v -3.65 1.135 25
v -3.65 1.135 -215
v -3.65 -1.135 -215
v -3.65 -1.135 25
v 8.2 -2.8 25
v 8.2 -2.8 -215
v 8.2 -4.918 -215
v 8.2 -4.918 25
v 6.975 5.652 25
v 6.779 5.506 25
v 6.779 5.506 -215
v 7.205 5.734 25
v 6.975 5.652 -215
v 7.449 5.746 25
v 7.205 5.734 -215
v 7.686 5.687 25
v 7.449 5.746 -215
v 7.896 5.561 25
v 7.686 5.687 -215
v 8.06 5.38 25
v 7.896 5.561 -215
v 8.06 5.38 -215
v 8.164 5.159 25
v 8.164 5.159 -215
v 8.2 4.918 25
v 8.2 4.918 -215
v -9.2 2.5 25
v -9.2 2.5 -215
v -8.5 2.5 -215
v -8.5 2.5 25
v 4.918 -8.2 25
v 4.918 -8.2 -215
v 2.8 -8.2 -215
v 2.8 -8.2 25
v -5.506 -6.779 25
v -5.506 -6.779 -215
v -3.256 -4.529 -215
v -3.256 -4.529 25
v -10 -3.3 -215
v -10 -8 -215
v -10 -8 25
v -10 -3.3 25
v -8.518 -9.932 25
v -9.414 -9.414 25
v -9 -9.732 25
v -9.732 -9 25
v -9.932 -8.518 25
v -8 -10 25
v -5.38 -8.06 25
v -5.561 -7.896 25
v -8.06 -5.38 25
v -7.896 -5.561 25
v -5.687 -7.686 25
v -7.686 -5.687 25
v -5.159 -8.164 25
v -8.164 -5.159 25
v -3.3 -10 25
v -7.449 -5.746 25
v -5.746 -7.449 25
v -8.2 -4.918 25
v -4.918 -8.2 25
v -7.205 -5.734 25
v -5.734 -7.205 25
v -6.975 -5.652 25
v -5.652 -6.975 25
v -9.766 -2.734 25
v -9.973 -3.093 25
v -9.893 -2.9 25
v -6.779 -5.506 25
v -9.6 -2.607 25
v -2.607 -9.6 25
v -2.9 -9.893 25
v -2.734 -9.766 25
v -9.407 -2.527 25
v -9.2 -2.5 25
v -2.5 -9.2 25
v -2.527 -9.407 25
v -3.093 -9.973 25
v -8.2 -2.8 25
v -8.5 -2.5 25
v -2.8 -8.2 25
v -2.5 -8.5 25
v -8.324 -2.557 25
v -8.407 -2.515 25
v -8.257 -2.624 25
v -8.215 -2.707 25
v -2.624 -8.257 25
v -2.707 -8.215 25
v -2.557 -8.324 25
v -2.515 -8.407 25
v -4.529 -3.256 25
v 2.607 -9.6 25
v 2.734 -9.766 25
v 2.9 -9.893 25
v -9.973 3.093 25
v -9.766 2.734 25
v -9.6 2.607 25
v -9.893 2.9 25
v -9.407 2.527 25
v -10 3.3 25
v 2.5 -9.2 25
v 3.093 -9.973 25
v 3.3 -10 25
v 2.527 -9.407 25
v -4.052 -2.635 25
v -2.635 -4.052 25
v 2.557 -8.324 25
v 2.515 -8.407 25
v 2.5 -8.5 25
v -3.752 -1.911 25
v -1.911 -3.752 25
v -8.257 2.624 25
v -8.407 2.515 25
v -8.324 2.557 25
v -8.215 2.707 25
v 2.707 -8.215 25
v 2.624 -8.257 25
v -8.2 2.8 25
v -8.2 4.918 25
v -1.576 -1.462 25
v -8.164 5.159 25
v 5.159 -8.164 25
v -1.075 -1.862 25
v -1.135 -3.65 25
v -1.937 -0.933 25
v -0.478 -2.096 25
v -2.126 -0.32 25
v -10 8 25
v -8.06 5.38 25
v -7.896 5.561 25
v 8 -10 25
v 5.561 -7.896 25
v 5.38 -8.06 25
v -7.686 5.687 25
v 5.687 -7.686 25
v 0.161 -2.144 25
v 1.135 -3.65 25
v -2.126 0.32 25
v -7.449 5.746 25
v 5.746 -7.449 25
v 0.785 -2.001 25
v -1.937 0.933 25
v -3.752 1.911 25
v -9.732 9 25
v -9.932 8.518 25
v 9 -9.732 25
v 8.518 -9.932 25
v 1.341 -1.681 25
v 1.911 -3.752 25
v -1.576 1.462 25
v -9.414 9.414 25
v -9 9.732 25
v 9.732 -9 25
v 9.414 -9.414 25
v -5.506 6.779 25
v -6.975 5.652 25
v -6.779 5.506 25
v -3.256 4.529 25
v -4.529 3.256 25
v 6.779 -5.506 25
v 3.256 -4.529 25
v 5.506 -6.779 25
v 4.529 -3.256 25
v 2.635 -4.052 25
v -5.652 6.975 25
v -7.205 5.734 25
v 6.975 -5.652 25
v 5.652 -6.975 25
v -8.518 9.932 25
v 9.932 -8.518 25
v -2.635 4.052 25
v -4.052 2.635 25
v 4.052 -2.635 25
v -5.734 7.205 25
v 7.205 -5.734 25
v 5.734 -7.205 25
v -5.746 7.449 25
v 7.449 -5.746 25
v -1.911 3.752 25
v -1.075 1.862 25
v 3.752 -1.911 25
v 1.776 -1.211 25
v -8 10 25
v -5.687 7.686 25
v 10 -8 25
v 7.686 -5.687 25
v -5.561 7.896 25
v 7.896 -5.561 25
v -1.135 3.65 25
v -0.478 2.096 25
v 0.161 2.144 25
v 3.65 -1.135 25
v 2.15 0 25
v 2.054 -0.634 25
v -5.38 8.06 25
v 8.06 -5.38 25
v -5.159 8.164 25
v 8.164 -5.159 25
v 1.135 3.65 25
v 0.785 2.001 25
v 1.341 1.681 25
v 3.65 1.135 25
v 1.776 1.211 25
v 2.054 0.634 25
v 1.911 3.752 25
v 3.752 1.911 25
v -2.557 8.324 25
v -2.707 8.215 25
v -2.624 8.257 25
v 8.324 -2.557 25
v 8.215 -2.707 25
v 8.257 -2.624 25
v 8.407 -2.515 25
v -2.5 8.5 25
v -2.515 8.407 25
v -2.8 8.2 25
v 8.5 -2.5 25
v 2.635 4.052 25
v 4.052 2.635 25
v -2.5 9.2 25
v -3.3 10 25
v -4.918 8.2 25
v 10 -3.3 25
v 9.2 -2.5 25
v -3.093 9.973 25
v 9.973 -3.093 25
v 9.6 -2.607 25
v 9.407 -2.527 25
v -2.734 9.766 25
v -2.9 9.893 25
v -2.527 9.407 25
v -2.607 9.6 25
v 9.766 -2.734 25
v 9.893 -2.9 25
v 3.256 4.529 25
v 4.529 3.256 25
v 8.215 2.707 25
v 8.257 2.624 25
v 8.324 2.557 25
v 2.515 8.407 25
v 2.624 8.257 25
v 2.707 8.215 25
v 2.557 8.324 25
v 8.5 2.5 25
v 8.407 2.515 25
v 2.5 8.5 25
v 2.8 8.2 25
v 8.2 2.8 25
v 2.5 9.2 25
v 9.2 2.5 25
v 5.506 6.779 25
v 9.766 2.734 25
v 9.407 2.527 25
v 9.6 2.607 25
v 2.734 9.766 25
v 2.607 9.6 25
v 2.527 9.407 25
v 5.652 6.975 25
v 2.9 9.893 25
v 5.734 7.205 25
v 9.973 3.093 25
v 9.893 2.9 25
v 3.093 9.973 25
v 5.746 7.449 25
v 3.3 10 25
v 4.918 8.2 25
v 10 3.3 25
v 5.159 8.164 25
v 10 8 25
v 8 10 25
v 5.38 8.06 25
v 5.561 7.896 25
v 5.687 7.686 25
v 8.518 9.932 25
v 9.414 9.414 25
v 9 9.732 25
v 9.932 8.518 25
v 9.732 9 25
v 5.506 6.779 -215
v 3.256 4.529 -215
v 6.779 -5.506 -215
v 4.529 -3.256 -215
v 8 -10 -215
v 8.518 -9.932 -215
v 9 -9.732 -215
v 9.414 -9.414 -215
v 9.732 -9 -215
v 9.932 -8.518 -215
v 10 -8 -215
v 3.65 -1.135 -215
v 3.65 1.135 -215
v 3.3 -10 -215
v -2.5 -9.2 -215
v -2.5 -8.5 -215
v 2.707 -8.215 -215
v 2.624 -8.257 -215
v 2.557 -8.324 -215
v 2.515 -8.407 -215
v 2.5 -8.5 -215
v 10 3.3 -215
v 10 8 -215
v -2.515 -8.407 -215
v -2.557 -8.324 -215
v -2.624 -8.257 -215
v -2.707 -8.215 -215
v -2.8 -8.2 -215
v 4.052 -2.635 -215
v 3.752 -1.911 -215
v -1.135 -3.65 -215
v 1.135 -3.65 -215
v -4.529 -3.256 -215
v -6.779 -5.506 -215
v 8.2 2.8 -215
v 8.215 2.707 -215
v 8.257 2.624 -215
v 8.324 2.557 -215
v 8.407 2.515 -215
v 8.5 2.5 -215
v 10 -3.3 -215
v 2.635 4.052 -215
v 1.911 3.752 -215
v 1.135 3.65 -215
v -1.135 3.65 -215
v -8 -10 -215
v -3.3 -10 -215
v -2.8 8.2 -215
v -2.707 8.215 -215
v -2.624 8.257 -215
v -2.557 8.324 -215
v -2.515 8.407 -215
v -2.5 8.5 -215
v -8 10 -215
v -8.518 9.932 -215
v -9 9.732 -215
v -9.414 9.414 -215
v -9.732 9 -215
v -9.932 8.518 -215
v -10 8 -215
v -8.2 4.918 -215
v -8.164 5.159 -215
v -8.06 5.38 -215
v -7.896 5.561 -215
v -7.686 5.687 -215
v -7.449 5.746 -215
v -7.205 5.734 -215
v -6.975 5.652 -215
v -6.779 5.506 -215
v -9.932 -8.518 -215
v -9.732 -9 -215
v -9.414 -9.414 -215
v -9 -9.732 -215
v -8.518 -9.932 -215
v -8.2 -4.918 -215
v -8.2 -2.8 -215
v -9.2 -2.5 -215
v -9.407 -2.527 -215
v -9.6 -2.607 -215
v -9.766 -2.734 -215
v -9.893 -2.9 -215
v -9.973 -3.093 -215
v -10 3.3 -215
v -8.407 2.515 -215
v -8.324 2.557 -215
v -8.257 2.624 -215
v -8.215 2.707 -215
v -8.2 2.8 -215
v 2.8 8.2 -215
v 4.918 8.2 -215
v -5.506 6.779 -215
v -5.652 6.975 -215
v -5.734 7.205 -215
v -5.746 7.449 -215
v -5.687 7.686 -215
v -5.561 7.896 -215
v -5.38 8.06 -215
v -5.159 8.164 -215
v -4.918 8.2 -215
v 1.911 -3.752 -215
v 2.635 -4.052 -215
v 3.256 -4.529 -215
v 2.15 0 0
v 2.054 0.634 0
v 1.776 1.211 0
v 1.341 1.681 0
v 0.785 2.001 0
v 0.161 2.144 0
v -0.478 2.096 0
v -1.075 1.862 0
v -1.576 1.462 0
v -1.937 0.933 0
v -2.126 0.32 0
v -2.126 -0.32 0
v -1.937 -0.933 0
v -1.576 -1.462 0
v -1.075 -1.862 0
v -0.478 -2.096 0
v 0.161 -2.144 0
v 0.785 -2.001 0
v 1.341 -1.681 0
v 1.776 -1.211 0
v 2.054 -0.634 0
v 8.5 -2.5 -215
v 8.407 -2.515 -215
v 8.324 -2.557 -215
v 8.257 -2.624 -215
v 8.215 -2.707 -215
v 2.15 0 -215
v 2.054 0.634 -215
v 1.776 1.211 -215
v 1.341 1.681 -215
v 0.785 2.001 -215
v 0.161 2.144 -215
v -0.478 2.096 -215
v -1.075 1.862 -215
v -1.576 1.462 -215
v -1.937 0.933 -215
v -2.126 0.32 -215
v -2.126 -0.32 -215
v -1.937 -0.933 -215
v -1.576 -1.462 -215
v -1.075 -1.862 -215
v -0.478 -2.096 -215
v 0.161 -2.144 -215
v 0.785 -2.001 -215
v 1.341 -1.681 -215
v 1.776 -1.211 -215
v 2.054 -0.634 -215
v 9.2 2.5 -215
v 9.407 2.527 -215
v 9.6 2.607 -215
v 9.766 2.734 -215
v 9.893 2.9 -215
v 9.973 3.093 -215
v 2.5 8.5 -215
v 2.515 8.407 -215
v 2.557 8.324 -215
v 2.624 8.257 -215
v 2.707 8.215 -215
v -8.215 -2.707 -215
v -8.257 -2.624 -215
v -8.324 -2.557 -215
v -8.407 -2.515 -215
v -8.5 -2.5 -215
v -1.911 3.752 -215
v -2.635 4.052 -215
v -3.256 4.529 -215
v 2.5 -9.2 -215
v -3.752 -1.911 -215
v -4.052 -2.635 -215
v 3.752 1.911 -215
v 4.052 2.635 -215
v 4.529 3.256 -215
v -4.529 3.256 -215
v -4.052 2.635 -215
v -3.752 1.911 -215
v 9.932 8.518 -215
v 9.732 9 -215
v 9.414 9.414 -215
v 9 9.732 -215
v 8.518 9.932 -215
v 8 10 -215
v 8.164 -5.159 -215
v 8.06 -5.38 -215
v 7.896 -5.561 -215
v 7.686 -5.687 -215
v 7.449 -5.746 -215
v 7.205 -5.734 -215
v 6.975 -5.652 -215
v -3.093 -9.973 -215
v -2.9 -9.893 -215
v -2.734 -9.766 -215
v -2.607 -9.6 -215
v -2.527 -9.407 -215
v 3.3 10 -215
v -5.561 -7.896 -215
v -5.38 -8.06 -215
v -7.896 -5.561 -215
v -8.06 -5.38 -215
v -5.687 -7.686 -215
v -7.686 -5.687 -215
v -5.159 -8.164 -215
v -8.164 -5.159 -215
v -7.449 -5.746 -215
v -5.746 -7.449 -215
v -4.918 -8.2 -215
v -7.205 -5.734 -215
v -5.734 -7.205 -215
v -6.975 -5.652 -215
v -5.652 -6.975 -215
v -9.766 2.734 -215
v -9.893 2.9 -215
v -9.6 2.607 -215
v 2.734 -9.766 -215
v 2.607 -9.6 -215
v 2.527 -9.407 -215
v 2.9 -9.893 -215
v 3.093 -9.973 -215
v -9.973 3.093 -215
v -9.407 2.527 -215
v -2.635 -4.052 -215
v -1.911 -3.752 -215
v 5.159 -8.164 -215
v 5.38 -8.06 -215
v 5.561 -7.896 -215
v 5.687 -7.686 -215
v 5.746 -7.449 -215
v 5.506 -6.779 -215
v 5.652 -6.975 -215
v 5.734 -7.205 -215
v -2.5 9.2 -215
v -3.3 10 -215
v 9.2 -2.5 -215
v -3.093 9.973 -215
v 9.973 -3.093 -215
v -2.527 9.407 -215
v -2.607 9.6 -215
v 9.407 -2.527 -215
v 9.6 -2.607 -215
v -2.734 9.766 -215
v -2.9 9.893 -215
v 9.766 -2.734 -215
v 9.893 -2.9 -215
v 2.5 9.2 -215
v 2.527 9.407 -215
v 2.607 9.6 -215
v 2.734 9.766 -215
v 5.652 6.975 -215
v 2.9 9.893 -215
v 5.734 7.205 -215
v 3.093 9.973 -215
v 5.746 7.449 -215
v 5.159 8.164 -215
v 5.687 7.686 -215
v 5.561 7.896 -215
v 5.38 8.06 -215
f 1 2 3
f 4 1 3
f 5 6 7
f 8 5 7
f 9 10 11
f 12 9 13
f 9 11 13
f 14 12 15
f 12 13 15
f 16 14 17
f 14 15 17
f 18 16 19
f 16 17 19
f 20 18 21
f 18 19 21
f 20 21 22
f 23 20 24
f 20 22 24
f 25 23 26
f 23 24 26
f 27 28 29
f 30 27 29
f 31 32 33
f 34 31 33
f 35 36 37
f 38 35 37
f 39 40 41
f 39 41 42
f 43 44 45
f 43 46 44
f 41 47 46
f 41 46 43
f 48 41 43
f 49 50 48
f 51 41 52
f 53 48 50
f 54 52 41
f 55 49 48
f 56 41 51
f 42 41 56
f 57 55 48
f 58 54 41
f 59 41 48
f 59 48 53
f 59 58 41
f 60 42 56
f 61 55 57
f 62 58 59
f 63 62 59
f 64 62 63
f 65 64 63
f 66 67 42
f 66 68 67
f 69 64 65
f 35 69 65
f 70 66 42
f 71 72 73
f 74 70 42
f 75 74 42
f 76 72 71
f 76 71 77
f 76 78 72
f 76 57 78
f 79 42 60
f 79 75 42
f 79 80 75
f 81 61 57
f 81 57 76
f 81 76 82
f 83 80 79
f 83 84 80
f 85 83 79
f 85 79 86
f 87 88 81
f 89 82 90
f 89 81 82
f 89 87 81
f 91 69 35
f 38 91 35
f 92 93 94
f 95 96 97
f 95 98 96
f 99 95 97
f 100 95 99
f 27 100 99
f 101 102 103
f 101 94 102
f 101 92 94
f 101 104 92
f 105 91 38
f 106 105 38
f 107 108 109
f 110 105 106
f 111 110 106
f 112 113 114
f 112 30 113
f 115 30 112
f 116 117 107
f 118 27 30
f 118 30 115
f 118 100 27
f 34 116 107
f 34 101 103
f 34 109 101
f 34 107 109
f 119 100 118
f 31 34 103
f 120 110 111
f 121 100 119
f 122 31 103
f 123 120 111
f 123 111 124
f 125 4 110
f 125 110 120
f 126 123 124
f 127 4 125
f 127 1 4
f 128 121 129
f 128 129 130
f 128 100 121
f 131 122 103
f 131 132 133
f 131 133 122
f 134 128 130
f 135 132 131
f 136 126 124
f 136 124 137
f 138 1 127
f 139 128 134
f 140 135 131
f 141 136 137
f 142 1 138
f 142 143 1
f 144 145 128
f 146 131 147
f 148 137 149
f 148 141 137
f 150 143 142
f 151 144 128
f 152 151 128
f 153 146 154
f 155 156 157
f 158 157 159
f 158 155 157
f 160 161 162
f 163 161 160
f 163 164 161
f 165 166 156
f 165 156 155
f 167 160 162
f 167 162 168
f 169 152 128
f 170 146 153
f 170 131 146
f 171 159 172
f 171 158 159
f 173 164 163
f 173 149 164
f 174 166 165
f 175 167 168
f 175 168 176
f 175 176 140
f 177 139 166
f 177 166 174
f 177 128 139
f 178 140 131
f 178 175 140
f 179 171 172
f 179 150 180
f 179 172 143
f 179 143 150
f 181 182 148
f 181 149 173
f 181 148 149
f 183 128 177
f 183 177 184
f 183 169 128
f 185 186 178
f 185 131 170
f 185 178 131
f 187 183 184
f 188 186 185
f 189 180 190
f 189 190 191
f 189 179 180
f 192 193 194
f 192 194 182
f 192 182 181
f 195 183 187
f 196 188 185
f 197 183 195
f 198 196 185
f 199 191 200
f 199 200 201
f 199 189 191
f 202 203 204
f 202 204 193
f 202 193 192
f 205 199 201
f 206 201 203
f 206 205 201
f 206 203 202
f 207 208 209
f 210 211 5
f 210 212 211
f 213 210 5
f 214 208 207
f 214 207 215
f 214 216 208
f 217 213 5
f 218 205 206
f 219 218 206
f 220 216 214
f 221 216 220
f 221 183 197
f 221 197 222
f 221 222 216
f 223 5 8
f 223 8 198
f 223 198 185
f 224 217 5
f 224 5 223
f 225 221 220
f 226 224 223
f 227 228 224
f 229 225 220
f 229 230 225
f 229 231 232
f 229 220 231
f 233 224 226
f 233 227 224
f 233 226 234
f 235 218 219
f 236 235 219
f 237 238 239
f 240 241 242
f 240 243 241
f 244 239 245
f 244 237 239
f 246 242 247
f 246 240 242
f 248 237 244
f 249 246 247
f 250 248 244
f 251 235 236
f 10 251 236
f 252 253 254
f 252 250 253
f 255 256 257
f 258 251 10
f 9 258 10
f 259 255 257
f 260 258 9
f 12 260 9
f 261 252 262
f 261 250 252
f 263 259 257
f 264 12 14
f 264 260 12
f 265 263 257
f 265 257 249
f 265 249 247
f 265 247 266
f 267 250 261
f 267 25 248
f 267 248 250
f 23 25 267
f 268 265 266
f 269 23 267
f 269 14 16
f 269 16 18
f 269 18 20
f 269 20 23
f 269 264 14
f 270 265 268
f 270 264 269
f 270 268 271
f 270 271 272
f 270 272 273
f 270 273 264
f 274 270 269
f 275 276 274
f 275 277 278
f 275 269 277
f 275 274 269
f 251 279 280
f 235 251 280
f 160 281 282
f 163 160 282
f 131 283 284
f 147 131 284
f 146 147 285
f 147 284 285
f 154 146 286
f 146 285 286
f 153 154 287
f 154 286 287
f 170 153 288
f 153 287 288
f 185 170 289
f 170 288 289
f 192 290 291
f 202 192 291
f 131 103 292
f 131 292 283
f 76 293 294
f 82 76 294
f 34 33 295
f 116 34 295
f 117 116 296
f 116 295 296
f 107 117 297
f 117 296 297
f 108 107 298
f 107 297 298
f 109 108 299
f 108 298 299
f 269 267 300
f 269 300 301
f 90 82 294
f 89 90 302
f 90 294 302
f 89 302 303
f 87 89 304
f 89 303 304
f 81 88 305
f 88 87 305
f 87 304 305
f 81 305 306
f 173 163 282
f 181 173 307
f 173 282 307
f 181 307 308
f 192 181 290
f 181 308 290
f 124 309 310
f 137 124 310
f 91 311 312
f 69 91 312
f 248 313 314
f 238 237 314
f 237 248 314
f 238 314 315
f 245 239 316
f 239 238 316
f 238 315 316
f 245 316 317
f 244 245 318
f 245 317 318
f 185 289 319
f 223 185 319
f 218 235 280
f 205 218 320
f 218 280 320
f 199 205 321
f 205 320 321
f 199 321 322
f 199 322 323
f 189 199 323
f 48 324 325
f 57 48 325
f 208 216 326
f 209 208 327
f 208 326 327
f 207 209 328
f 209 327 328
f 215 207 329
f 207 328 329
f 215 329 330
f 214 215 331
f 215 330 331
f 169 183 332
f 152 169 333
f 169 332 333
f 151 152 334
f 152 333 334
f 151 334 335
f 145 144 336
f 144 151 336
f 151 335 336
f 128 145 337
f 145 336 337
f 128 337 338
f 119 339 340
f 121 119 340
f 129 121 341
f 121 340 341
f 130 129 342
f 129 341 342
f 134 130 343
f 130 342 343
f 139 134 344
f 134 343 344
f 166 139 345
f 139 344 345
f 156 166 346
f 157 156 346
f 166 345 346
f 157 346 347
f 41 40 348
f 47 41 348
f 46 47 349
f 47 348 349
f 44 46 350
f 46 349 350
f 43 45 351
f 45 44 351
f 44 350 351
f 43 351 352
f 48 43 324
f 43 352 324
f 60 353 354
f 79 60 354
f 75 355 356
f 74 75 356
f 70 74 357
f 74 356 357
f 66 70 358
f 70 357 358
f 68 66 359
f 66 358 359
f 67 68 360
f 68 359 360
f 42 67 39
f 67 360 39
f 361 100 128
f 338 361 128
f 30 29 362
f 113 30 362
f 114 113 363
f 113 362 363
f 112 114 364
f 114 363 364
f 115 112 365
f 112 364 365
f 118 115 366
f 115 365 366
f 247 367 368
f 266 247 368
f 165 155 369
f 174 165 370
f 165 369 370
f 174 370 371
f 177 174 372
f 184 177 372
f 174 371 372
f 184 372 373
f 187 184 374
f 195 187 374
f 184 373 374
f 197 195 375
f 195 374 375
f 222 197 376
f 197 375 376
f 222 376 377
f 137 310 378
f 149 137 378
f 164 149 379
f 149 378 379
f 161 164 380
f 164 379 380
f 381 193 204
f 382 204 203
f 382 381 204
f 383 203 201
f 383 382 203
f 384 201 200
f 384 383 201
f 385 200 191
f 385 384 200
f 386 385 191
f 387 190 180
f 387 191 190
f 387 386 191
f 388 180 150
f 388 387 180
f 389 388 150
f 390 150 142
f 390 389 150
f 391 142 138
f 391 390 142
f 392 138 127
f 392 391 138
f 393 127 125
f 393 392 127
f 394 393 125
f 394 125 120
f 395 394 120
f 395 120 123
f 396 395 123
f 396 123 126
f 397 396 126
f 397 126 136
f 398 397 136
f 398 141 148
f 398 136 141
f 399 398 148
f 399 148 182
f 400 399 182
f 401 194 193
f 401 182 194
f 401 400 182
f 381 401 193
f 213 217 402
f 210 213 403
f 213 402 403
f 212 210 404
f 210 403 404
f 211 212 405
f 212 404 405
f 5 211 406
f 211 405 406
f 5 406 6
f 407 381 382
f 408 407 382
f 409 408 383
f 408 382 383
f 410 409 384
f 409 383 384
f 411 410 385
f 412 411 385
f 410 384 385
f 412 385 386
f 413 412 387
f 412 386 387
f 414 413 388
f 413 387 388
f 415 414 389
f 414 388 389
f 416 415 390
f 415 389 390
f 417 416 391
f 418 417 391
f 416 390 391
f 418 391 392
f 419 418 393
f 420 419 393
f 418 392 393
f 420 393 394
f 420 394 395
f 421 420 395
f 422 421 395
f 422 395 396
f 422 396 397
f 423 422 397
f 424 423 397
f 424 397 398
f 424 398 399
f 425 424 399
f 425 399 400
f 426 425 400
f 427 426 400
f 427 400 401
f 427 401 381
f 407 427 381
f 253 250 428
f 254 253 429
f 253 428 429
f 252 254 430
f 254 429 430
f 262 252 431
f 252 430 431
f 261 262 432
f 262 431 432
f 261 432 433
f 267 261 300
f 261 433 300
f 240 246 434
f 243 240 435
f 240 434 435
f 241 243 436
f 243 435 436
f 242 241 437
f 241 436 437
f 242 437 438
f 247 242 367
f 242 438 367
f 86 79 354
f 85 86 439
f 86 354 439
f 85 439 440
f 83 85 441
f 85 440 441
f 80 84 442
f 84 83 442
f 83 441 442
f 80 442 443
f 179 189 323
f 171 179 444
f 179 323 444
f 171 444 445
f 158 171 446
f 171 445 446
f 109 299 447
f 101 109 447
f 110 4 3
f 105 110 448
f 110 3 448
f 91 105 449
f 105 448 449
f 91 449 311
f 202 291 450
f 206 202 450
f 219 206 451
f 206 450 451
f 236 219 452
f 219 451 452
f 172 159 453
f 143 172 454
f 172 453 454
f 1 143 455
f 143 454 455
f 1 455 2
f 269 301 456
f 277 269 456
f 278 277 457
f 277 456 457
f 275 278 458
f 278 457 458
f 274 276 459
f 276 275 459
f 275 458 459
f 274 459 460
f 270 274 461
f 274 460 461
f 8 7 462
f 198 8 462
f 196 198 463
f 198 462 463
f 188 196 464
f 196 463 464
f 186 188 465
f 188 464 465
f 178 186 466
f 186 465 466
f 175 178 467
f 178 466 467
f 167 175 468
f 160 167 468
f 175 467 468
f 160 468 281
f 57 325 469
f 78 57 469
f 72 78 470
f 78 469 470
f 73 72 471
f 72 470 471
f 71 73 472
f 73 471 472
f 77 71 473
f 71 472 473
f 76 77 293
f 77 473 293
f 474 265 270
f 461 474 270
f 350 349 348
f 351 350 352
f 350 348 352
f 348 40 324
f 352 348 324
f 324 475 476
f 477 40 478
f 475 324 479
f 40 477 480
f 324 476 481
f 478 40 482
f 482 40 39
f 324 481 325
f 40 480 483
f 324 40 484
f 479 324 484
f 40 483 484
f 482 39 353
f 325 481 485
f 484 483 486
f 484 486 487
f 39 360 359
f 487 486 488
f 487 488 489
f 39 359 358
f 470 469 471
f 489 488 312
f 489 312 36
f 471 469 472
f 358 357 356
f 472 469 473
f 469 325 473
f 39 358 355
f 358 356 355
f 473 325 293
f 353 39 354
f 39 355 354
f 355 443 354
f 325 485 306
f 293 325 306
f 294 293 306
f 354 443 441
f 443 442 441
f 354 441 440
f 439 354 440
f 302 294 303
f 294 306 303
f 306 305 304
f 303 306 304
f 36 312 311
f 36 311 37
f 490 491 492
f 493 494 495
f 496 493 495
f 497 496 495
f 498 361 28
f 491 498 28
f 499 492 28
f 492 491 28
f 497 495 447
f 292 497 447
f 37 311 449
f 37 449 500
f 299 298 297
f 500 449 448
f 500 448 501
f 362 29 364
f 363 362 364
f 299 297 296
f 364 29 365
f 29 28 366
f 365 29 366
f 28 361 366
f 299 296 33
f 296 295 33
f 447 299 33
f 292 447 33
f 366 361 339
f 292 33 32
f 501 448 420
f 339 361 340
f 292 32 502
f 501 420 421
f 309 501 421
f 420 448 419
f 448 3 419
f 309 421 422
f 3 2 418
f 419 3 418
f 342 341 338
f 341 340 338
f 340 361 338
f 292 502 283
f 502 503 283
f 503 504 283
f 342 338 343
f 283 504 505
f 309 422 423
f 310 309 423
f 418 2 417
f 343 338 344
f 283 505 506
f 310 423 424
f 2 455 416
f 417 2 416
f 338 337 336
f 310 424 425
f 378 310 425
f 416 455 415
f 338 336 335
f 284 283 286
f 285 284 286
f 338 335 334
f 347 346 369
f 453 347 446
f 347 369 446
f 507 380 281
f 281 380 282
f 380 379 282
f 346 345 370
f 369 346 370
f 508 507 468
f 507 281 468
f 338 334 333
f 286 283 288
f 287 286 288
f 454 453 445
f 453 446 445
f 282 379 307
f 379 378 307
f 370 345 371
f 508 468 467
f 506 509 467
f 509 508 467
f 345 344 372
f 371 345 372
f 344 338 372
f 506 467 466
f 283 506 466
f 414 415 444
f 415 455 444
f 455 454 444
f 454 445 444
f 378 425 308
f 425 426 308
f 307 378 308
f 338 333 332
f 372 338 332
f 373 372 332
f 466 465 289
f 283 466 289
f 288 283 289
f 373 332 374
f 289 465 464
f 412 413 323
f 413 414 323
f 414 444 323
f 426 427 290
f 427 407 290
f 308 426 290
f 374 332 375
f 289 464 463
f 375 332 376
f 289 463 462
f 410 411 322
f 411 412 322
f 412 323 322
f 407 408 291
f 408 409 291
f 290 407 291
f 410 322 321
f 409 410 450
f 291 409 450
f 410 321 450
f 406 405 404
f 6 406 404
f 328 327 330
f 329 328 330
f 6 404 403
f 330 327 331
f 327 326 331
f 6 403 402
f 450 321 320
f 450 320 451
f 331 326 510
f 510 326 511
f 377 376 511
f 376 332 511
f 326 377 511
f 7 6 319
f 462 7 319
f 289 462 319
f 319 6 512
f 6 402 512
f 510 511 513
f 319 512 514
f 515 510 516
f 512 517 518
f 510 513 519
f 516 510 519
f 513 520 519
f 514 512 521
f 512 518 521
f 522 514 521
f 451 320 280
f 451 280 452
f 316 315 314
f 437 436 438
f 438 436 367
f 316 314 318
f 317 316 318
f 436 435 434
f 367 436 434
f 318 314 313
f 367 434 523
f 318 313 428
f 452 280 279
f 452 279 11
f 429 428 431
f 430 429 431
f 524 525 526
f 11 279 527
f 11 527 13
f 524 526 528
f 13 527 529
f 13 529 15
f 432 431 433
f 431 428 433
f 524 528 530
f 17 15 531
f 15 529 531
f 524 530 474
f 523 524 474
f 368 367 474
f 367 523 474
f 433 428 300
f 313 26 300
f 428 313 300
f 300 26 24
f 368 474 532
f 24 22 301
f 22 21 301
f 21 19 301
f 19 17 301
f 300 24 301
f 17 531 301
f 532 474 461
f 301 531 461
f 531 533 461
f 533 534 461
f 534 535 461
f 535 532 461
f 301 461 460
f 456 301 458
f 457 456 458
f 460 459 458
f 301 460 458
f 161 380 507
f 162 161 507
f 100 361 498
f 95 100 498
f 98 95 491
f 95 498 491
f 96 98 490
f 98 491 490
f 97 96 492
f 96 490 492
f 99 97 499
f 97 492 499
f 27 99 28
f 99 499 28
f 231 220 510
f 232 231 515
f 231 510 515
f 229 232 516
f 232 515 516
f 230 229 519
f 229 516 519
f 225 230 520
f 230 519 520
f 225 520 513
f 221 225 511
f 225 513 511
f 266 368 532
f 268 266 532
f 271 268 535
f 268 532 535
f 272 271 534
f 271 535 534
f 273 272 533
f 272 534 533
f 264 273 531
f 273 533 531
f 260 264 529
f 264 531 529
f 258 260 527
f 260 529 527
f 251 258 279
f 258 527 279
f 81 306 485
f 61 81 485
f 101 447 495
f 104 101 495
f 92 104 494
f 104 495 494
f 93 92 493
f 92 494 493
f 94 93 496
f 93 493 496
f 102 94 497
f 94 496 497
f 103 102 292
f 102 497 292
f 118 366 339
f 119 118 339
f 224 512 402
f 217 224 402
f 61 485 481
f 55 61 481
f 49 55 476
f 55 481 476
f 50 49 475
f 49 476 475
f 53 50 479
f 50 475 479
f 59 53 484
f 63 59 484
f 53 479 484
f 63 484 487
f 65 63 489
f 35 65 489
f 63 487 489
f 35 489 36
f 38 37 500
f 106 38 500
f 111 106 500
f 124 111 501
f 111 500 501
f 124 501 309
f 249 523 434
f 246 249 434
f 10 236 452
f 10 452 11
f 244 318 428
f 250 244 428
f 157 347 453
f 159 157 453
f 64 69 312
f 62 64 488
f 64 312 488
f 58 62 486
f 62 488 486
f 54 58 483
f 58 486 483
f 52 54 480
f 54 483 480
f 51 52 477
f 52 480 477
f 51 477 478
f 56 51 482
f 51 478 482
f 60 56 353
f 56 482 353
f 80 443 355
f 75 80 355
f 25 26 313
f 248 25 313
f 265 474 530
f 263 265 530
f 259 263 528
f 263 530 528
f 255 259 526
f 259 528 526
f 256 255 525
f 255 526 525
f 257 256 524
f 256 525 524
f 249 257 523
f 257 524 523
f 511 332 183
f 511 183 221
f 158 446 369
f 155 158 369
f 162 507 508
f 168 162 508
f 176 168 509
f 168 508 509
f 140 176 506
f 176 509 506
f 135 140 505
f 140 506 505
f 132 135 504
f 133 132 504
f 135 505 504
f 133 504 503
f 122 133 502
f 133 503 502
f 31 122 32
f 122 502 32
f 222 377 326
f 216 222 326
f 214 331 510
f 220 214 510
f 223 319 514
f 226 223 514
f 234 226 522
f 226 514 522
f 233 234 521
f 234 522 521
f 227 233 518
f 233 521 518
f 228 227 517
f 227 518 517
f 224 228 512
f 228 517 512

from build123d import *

# Parameters (mm, degrees)
SKETCH4_W              = 20
SKETCH4_H              = 20
BODY_DEPTH             = 240
SKETCH16_OUTSIDE_W     = 70.332
SKETCH16_OUTSIDE_H     = 70.332
SKETCH16_OUTSIDE_R     = 2.15
CUT_PROFILE_DEPTH      = 26
CUT_PROFILE_DEPTH_BACK = 216


with BuildPart() as part:
    # Sketch4 → Body (new body)
    with BuildSketch(Plane.XY.offset(25)):
        Rectangle(SKETCH4_W, SKETCH4_H)
    extrude(amount=-BODY_DEPTH)

    # Sketch16 outside → Cut-Profile (cut, two sides)
    with BuildSketch(Plane.XY) as cut_profile_sk:
        Rectangle(SKETCH16_OUTSIDE_W, SKETCH16_OUTSIDE_H)
        with BuildLine():
            Line((4.917588389, -8.199999991), (2.799999989, -8.199999991))
            ThreePointArc((2.799999989, -8.199999991), (2.587867955, -8.287867957), (2.499999989, -8.499999991))
            Line((2.499999989, -8.499999991), (2.499999989, -9.199999991))
            ThreePointArc((2.499999989, -9.199999991), (2.734314564, -9.765685416), (3.299999989, -9.999999991))
            Line((3.299999989, -9.999999991), (7.999999989, -9.999999991))
            ThreePointArc((7.999999989, -9.999999991), (9.414213552, -9.414213554), (9.999999989, -7.999999991))
            Line((9.999999989, -7.999999991), (9.999999989, -3.299999991))
            ThreePointArc((9.999999989, -3.299999991), (9.765685414, -2.734314566), (9.199999989, -2.499999991))
            Line((9.199999989, -2.499999991), (8.499999989, -2.499999991))
            ThreePointArc((8.499999989, -2.499999991), (8.287867955, -2.587867957), (8.199999989, -2.799999991))
            Line((8.199999989, -2.799999991), (8.199999989, -4.917588391))
            ThreePointArc((8.199999989, -4.917588391), (7.686138511, -5.686636441), (6.778984485, -5.506192286))
            Line((6.778984485, -5.506192286), (4.528679645, -3.255887446))
            ThreePointArc((4.528679645, -3.255887446), (3.878361392, -2.282617401), (3.64999999, -1.134567106))
            Line((3.64999999, -1.134567106), (3.64999999, 1.134567104))
            ThreePointArc((3.64999999, 1.134567104), (3.878361393, 2.282617402), (4.528679647, 3.255887448))
            Line((4.528679647, 3.255887448), (6.778984487, 5.506192288))
            ThreePointArc((6.778984487, 5.506192288), (7.686138506, 5.686636442), (8.199999981, 4.917588398))
            Line((8.199999981, 4.917588398), (8.199999981, 2.799999998))
            ThreePointArc((8.199999981, 2.799999998), (8.287867946, 2.587867964), (8.499999981, 2.499999998))
            Line((8.499999981, 2.499999998), (9.199999981, 2.499999998))
            ThreePointArc((9.199999981, 2.499999998), (9.765685406, 2.734314573), (9.999999981, 3.299999998))
            Line((9.999999981, 3.299999998), (9.999999981, 7.999999998))
            ThreePointArc((9.999999981, 7.999999998), (9.414213543, 9.41421356), (7.999999981, 9.999999998))
            Line((7.999999981, 9.999999998), (3.299999981, 9.999999998))
            ThreePointArc((3.299999981, 9.999999998), (2.734314556, 9.765685423), (2.499999981, 9.199999998))
            Line((2.499999981, 9.199999998), (2.499999981, 8.499999998))
            ThreePointArc((2.499999981, 8.499999998), (2.587867946, 8.287867964), (2.799999981, 8.199999998))
            Line((2.799999981, 8.199999998), (4.917588381, 8.199999998))
            ThreePointArc((4.917588381, 8.199999998), (5.68663643, 7.68613852), (5.506192275, 6.778984494))
            Line((5.506192275, 6.778984494), (3.255887435, 4.528679654))
            ThreePointArc((3.255887435, 4.528679654), (2.28261739, 3.878361401), (1.134567095, 3.649999999))
            Line((1.134567095, 3.649999999), (-1.134567115, 3.649999999))
            ThreePointArc((-1.134567115, 3.649999999), (-2.282617412, 3.878361401), (-3.255887459, 4.528679655))
            Line((-3.255887459, 4.528679655), (-5.506192299, 6.778984495))
            ThreePointArc((-5.506192299, 6.778984495), (-5.686636452, 7.686138515), (-4.917588409, 8.199999989))
            Line((-4.917588409, 8.199999989), (-2.800000009, 8.199999989))
            ThreePointArc((-2.800000009, 8.199999989), (-2.587867974, 8.287867955), (-2.500000009, 8.499999989))
            Line((-2.500000009, 8.499999989), (-2.500000009, 9.199999989))
            ThreePointArc((-2.500000009, 9.199999989), (-2.734314584, 9.765685414), (-3.300000009, 9.999999989))
            Line((-3.300000009, 9.999999989), (-8.000000009, 9.999999989))
            ThreePointArc((-8.000000009, 9.999999989), (-9.414213571, 9.414213552), (-10.000000009, 7.999999989))
            Line((-10.000000009, 7.999999989), (-10.000000009, 3.299999989))
            ThreePointArc((-10.000000009, 3.299999989), (-9.765685434, 2.734314564), (-9.200000009, 2.499999989))
            Line((-9.200000009, 2.499999989), (-8.500000009, 2.499999989))
            ThreePointArc((-8.500000009, 2.499999989), (-8.287867974, 2.587867955), (-8.200000009, 2.799999989))
            Line((-8.200000009, 2.799999989), (-8.200000009, 4.917588389))
            ThreePointArc((-8.200000009, 4.917588389), (-7.686138531, 5.686636438), (-6.778984504, 5.506192284))
            Line((-6.778984504, 5.506192284), (-4.528679664, 3.255887444))
            ThreePointArc((-4.528679664, 3.255887444), (-3.878361412, 2.282617399), (-3.650000009, 1.134567104))
            Line((-3.650000009, 1.134567104), (-3.650000009, -1.134567106))
            ThreePointArc((-3.650000009, -1.134567106), (-3.878361412, -2.282617404), (-4.528679666, -3.25588745))
            Line((-4.528679666, -3.25588745), (-6.778984506, -5.50619229))
            ThreePointArc((-6.778984506, -5.50619229), (-7.686138526, -5.686636444), (-8.2, -4.9175884))
            Line((-8.2, -4.9175884), (-8.2, -2.8))
            ThreePointArc((-8.2, -2.8), (-8.287867966, -2.587867966), (-8.5, -2.5))
            Line((-8.5, -2.5), (-9.2, -2.5))
            ThreePointArc((-9.2, -2.5), (-9.765685425, -2.734314575), (-10, -3.3))
            Line((-10, -3.3), (-10, -8))
            ThreePointArc((-10, -8), (-9.414213562, -9.414213562), (-8, -10))
            Line((-8, -10), (-3.3, -10))
            ThreePointArc((-3.3, -10), (-2.734314575, -9.765685425), (-2.5, -9.2))
            Line((-2.5, -9.2), (-2.5, -8.5))
            ThreePointArc((-2.5, -8.5), (-2.587867966, -8.287867966), (-2.8, -8.2))
            Line((-2.8, -8.2), (-4.9175884, -8.2))
            ThreePointArc((-4.9175884, -8.2), (-5.686636449, -7.686138522), (-5.506192294, -6.778984496))
            Line((-5.506192294, -6.778984496), (-3.255887454, -4.528679656))
            ThreePointArc((-3.255887454, -4.528679656), (-2.282617409, -3.878361403), (-1.134567114, -3.650000001))
            Line((-1.134567114, -3.650000001), (1.134567096, -3.650000001))
            ThreePointArc((1.134567096, -3.650000001), (2.282617393, -3.878361403), (3.255887439, -4.528679657))
            Line((3.255887439, -4.528679657), (5.506192279, -6.778984497))
            ThreePointArc((5.506192279, -6.778984497), (5.686636433, -7.686138517), (4.917588389, -8.199999991))
        make_face(mode=Mode.SUBTRACT)
        Circle(SKETCH16_OUTSIDE_R)
    extrude(amount=CUT_PROFILE_DEPTH, mode=Mode.SUBTRACT)
    extrude(cut_profile_sk.sketch, amount=-CUT_PROFILE_DEPTH_BACK, mode=Mode.SUBTRACT)


solid = part.part
